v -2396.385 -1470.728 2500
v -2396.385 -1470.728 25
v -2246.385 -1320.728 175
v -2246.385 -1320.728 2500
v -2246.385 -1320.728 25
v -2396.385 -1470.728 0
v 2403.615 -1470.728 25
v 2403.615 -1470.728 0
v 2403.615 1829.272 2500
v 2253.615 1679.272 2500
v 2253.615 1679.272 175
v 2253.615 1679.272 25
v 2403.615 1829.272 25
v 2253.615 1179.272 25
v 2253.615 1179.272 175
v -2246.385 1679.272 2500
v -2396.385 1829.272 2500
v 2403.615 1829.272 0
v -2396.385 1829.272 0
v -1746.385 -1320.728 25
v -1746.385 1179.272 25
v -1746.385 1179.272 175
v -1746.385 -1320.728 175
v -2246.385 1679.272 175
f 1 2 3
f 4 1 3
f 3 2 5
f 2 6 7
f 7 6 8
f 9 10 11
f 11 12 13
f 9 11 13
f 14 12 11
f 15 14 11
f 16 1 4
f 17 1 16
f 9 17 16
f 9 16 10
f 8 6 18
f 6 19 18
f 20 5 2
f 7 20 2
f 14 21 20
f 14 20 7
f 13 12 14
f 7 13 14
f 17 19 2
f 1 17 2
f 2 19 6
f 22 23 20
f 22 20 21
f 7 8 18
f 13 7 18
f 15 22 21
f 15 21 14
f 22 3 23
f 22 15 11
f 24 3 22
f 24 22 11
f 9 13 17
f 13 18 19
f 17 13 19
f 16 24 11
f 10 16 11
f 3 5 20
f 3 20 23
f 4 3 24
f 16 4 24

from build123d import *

# Parameters (mm, degrees)
F1_DEPTH = 2500
F2_DEPTH = 25
F4_W     = 4500
F4_H     = 150
F5_DEPTH = 500
F3_W     = 3000
F3_H     = 150
F6_DEPTH = 500


with BuildPart() as f1:
    # F0 (on Top) → F1 (new body)
    with BuildSketch(Plane.XY):
        Polygon((-2246.385151, -1320.728417), (-2246.385151, 1679.271583), (2253.614849, 1679.271583), (2403.614849, 1829.271583), (-2396.385151, 1829.271583), (-2396.385151, -1470.728417), align=None)
    extrude(amount=F1_DEPTH)

    # F0 (on Top) → F2 (join)
    with BuildSketch(Plane.XY):
        Polygon((2253.614849, 1679.271583), (-2246.385151, 1679.271583), (-2246.385151, -1320.728417), (-2396.385151, -1470.728417), (2403.614849, -1470.728417), (2403.614849, 1829.271583), align=None)
    extrude(amount=F2_DEPTH)

    # F4 (on face) → F5 (join)
    with BuildSketch(Plane.XZ.offset(-1679.271583)):
        with Locations((3.614849, 100)):
            Rectangle(F4_W, F4_H)
    extrude(amount=F5_DEPTH)

    # F3 (on face) → F6 (join)
    with BuildSketch(Plane.YZ.offset(-2246.385151)):
        with Locations((179.271583, 100)):
            Rectangle(F3_W, F3_H)
    extrude(amount=F6_DEPTH)


solid = f1.part
